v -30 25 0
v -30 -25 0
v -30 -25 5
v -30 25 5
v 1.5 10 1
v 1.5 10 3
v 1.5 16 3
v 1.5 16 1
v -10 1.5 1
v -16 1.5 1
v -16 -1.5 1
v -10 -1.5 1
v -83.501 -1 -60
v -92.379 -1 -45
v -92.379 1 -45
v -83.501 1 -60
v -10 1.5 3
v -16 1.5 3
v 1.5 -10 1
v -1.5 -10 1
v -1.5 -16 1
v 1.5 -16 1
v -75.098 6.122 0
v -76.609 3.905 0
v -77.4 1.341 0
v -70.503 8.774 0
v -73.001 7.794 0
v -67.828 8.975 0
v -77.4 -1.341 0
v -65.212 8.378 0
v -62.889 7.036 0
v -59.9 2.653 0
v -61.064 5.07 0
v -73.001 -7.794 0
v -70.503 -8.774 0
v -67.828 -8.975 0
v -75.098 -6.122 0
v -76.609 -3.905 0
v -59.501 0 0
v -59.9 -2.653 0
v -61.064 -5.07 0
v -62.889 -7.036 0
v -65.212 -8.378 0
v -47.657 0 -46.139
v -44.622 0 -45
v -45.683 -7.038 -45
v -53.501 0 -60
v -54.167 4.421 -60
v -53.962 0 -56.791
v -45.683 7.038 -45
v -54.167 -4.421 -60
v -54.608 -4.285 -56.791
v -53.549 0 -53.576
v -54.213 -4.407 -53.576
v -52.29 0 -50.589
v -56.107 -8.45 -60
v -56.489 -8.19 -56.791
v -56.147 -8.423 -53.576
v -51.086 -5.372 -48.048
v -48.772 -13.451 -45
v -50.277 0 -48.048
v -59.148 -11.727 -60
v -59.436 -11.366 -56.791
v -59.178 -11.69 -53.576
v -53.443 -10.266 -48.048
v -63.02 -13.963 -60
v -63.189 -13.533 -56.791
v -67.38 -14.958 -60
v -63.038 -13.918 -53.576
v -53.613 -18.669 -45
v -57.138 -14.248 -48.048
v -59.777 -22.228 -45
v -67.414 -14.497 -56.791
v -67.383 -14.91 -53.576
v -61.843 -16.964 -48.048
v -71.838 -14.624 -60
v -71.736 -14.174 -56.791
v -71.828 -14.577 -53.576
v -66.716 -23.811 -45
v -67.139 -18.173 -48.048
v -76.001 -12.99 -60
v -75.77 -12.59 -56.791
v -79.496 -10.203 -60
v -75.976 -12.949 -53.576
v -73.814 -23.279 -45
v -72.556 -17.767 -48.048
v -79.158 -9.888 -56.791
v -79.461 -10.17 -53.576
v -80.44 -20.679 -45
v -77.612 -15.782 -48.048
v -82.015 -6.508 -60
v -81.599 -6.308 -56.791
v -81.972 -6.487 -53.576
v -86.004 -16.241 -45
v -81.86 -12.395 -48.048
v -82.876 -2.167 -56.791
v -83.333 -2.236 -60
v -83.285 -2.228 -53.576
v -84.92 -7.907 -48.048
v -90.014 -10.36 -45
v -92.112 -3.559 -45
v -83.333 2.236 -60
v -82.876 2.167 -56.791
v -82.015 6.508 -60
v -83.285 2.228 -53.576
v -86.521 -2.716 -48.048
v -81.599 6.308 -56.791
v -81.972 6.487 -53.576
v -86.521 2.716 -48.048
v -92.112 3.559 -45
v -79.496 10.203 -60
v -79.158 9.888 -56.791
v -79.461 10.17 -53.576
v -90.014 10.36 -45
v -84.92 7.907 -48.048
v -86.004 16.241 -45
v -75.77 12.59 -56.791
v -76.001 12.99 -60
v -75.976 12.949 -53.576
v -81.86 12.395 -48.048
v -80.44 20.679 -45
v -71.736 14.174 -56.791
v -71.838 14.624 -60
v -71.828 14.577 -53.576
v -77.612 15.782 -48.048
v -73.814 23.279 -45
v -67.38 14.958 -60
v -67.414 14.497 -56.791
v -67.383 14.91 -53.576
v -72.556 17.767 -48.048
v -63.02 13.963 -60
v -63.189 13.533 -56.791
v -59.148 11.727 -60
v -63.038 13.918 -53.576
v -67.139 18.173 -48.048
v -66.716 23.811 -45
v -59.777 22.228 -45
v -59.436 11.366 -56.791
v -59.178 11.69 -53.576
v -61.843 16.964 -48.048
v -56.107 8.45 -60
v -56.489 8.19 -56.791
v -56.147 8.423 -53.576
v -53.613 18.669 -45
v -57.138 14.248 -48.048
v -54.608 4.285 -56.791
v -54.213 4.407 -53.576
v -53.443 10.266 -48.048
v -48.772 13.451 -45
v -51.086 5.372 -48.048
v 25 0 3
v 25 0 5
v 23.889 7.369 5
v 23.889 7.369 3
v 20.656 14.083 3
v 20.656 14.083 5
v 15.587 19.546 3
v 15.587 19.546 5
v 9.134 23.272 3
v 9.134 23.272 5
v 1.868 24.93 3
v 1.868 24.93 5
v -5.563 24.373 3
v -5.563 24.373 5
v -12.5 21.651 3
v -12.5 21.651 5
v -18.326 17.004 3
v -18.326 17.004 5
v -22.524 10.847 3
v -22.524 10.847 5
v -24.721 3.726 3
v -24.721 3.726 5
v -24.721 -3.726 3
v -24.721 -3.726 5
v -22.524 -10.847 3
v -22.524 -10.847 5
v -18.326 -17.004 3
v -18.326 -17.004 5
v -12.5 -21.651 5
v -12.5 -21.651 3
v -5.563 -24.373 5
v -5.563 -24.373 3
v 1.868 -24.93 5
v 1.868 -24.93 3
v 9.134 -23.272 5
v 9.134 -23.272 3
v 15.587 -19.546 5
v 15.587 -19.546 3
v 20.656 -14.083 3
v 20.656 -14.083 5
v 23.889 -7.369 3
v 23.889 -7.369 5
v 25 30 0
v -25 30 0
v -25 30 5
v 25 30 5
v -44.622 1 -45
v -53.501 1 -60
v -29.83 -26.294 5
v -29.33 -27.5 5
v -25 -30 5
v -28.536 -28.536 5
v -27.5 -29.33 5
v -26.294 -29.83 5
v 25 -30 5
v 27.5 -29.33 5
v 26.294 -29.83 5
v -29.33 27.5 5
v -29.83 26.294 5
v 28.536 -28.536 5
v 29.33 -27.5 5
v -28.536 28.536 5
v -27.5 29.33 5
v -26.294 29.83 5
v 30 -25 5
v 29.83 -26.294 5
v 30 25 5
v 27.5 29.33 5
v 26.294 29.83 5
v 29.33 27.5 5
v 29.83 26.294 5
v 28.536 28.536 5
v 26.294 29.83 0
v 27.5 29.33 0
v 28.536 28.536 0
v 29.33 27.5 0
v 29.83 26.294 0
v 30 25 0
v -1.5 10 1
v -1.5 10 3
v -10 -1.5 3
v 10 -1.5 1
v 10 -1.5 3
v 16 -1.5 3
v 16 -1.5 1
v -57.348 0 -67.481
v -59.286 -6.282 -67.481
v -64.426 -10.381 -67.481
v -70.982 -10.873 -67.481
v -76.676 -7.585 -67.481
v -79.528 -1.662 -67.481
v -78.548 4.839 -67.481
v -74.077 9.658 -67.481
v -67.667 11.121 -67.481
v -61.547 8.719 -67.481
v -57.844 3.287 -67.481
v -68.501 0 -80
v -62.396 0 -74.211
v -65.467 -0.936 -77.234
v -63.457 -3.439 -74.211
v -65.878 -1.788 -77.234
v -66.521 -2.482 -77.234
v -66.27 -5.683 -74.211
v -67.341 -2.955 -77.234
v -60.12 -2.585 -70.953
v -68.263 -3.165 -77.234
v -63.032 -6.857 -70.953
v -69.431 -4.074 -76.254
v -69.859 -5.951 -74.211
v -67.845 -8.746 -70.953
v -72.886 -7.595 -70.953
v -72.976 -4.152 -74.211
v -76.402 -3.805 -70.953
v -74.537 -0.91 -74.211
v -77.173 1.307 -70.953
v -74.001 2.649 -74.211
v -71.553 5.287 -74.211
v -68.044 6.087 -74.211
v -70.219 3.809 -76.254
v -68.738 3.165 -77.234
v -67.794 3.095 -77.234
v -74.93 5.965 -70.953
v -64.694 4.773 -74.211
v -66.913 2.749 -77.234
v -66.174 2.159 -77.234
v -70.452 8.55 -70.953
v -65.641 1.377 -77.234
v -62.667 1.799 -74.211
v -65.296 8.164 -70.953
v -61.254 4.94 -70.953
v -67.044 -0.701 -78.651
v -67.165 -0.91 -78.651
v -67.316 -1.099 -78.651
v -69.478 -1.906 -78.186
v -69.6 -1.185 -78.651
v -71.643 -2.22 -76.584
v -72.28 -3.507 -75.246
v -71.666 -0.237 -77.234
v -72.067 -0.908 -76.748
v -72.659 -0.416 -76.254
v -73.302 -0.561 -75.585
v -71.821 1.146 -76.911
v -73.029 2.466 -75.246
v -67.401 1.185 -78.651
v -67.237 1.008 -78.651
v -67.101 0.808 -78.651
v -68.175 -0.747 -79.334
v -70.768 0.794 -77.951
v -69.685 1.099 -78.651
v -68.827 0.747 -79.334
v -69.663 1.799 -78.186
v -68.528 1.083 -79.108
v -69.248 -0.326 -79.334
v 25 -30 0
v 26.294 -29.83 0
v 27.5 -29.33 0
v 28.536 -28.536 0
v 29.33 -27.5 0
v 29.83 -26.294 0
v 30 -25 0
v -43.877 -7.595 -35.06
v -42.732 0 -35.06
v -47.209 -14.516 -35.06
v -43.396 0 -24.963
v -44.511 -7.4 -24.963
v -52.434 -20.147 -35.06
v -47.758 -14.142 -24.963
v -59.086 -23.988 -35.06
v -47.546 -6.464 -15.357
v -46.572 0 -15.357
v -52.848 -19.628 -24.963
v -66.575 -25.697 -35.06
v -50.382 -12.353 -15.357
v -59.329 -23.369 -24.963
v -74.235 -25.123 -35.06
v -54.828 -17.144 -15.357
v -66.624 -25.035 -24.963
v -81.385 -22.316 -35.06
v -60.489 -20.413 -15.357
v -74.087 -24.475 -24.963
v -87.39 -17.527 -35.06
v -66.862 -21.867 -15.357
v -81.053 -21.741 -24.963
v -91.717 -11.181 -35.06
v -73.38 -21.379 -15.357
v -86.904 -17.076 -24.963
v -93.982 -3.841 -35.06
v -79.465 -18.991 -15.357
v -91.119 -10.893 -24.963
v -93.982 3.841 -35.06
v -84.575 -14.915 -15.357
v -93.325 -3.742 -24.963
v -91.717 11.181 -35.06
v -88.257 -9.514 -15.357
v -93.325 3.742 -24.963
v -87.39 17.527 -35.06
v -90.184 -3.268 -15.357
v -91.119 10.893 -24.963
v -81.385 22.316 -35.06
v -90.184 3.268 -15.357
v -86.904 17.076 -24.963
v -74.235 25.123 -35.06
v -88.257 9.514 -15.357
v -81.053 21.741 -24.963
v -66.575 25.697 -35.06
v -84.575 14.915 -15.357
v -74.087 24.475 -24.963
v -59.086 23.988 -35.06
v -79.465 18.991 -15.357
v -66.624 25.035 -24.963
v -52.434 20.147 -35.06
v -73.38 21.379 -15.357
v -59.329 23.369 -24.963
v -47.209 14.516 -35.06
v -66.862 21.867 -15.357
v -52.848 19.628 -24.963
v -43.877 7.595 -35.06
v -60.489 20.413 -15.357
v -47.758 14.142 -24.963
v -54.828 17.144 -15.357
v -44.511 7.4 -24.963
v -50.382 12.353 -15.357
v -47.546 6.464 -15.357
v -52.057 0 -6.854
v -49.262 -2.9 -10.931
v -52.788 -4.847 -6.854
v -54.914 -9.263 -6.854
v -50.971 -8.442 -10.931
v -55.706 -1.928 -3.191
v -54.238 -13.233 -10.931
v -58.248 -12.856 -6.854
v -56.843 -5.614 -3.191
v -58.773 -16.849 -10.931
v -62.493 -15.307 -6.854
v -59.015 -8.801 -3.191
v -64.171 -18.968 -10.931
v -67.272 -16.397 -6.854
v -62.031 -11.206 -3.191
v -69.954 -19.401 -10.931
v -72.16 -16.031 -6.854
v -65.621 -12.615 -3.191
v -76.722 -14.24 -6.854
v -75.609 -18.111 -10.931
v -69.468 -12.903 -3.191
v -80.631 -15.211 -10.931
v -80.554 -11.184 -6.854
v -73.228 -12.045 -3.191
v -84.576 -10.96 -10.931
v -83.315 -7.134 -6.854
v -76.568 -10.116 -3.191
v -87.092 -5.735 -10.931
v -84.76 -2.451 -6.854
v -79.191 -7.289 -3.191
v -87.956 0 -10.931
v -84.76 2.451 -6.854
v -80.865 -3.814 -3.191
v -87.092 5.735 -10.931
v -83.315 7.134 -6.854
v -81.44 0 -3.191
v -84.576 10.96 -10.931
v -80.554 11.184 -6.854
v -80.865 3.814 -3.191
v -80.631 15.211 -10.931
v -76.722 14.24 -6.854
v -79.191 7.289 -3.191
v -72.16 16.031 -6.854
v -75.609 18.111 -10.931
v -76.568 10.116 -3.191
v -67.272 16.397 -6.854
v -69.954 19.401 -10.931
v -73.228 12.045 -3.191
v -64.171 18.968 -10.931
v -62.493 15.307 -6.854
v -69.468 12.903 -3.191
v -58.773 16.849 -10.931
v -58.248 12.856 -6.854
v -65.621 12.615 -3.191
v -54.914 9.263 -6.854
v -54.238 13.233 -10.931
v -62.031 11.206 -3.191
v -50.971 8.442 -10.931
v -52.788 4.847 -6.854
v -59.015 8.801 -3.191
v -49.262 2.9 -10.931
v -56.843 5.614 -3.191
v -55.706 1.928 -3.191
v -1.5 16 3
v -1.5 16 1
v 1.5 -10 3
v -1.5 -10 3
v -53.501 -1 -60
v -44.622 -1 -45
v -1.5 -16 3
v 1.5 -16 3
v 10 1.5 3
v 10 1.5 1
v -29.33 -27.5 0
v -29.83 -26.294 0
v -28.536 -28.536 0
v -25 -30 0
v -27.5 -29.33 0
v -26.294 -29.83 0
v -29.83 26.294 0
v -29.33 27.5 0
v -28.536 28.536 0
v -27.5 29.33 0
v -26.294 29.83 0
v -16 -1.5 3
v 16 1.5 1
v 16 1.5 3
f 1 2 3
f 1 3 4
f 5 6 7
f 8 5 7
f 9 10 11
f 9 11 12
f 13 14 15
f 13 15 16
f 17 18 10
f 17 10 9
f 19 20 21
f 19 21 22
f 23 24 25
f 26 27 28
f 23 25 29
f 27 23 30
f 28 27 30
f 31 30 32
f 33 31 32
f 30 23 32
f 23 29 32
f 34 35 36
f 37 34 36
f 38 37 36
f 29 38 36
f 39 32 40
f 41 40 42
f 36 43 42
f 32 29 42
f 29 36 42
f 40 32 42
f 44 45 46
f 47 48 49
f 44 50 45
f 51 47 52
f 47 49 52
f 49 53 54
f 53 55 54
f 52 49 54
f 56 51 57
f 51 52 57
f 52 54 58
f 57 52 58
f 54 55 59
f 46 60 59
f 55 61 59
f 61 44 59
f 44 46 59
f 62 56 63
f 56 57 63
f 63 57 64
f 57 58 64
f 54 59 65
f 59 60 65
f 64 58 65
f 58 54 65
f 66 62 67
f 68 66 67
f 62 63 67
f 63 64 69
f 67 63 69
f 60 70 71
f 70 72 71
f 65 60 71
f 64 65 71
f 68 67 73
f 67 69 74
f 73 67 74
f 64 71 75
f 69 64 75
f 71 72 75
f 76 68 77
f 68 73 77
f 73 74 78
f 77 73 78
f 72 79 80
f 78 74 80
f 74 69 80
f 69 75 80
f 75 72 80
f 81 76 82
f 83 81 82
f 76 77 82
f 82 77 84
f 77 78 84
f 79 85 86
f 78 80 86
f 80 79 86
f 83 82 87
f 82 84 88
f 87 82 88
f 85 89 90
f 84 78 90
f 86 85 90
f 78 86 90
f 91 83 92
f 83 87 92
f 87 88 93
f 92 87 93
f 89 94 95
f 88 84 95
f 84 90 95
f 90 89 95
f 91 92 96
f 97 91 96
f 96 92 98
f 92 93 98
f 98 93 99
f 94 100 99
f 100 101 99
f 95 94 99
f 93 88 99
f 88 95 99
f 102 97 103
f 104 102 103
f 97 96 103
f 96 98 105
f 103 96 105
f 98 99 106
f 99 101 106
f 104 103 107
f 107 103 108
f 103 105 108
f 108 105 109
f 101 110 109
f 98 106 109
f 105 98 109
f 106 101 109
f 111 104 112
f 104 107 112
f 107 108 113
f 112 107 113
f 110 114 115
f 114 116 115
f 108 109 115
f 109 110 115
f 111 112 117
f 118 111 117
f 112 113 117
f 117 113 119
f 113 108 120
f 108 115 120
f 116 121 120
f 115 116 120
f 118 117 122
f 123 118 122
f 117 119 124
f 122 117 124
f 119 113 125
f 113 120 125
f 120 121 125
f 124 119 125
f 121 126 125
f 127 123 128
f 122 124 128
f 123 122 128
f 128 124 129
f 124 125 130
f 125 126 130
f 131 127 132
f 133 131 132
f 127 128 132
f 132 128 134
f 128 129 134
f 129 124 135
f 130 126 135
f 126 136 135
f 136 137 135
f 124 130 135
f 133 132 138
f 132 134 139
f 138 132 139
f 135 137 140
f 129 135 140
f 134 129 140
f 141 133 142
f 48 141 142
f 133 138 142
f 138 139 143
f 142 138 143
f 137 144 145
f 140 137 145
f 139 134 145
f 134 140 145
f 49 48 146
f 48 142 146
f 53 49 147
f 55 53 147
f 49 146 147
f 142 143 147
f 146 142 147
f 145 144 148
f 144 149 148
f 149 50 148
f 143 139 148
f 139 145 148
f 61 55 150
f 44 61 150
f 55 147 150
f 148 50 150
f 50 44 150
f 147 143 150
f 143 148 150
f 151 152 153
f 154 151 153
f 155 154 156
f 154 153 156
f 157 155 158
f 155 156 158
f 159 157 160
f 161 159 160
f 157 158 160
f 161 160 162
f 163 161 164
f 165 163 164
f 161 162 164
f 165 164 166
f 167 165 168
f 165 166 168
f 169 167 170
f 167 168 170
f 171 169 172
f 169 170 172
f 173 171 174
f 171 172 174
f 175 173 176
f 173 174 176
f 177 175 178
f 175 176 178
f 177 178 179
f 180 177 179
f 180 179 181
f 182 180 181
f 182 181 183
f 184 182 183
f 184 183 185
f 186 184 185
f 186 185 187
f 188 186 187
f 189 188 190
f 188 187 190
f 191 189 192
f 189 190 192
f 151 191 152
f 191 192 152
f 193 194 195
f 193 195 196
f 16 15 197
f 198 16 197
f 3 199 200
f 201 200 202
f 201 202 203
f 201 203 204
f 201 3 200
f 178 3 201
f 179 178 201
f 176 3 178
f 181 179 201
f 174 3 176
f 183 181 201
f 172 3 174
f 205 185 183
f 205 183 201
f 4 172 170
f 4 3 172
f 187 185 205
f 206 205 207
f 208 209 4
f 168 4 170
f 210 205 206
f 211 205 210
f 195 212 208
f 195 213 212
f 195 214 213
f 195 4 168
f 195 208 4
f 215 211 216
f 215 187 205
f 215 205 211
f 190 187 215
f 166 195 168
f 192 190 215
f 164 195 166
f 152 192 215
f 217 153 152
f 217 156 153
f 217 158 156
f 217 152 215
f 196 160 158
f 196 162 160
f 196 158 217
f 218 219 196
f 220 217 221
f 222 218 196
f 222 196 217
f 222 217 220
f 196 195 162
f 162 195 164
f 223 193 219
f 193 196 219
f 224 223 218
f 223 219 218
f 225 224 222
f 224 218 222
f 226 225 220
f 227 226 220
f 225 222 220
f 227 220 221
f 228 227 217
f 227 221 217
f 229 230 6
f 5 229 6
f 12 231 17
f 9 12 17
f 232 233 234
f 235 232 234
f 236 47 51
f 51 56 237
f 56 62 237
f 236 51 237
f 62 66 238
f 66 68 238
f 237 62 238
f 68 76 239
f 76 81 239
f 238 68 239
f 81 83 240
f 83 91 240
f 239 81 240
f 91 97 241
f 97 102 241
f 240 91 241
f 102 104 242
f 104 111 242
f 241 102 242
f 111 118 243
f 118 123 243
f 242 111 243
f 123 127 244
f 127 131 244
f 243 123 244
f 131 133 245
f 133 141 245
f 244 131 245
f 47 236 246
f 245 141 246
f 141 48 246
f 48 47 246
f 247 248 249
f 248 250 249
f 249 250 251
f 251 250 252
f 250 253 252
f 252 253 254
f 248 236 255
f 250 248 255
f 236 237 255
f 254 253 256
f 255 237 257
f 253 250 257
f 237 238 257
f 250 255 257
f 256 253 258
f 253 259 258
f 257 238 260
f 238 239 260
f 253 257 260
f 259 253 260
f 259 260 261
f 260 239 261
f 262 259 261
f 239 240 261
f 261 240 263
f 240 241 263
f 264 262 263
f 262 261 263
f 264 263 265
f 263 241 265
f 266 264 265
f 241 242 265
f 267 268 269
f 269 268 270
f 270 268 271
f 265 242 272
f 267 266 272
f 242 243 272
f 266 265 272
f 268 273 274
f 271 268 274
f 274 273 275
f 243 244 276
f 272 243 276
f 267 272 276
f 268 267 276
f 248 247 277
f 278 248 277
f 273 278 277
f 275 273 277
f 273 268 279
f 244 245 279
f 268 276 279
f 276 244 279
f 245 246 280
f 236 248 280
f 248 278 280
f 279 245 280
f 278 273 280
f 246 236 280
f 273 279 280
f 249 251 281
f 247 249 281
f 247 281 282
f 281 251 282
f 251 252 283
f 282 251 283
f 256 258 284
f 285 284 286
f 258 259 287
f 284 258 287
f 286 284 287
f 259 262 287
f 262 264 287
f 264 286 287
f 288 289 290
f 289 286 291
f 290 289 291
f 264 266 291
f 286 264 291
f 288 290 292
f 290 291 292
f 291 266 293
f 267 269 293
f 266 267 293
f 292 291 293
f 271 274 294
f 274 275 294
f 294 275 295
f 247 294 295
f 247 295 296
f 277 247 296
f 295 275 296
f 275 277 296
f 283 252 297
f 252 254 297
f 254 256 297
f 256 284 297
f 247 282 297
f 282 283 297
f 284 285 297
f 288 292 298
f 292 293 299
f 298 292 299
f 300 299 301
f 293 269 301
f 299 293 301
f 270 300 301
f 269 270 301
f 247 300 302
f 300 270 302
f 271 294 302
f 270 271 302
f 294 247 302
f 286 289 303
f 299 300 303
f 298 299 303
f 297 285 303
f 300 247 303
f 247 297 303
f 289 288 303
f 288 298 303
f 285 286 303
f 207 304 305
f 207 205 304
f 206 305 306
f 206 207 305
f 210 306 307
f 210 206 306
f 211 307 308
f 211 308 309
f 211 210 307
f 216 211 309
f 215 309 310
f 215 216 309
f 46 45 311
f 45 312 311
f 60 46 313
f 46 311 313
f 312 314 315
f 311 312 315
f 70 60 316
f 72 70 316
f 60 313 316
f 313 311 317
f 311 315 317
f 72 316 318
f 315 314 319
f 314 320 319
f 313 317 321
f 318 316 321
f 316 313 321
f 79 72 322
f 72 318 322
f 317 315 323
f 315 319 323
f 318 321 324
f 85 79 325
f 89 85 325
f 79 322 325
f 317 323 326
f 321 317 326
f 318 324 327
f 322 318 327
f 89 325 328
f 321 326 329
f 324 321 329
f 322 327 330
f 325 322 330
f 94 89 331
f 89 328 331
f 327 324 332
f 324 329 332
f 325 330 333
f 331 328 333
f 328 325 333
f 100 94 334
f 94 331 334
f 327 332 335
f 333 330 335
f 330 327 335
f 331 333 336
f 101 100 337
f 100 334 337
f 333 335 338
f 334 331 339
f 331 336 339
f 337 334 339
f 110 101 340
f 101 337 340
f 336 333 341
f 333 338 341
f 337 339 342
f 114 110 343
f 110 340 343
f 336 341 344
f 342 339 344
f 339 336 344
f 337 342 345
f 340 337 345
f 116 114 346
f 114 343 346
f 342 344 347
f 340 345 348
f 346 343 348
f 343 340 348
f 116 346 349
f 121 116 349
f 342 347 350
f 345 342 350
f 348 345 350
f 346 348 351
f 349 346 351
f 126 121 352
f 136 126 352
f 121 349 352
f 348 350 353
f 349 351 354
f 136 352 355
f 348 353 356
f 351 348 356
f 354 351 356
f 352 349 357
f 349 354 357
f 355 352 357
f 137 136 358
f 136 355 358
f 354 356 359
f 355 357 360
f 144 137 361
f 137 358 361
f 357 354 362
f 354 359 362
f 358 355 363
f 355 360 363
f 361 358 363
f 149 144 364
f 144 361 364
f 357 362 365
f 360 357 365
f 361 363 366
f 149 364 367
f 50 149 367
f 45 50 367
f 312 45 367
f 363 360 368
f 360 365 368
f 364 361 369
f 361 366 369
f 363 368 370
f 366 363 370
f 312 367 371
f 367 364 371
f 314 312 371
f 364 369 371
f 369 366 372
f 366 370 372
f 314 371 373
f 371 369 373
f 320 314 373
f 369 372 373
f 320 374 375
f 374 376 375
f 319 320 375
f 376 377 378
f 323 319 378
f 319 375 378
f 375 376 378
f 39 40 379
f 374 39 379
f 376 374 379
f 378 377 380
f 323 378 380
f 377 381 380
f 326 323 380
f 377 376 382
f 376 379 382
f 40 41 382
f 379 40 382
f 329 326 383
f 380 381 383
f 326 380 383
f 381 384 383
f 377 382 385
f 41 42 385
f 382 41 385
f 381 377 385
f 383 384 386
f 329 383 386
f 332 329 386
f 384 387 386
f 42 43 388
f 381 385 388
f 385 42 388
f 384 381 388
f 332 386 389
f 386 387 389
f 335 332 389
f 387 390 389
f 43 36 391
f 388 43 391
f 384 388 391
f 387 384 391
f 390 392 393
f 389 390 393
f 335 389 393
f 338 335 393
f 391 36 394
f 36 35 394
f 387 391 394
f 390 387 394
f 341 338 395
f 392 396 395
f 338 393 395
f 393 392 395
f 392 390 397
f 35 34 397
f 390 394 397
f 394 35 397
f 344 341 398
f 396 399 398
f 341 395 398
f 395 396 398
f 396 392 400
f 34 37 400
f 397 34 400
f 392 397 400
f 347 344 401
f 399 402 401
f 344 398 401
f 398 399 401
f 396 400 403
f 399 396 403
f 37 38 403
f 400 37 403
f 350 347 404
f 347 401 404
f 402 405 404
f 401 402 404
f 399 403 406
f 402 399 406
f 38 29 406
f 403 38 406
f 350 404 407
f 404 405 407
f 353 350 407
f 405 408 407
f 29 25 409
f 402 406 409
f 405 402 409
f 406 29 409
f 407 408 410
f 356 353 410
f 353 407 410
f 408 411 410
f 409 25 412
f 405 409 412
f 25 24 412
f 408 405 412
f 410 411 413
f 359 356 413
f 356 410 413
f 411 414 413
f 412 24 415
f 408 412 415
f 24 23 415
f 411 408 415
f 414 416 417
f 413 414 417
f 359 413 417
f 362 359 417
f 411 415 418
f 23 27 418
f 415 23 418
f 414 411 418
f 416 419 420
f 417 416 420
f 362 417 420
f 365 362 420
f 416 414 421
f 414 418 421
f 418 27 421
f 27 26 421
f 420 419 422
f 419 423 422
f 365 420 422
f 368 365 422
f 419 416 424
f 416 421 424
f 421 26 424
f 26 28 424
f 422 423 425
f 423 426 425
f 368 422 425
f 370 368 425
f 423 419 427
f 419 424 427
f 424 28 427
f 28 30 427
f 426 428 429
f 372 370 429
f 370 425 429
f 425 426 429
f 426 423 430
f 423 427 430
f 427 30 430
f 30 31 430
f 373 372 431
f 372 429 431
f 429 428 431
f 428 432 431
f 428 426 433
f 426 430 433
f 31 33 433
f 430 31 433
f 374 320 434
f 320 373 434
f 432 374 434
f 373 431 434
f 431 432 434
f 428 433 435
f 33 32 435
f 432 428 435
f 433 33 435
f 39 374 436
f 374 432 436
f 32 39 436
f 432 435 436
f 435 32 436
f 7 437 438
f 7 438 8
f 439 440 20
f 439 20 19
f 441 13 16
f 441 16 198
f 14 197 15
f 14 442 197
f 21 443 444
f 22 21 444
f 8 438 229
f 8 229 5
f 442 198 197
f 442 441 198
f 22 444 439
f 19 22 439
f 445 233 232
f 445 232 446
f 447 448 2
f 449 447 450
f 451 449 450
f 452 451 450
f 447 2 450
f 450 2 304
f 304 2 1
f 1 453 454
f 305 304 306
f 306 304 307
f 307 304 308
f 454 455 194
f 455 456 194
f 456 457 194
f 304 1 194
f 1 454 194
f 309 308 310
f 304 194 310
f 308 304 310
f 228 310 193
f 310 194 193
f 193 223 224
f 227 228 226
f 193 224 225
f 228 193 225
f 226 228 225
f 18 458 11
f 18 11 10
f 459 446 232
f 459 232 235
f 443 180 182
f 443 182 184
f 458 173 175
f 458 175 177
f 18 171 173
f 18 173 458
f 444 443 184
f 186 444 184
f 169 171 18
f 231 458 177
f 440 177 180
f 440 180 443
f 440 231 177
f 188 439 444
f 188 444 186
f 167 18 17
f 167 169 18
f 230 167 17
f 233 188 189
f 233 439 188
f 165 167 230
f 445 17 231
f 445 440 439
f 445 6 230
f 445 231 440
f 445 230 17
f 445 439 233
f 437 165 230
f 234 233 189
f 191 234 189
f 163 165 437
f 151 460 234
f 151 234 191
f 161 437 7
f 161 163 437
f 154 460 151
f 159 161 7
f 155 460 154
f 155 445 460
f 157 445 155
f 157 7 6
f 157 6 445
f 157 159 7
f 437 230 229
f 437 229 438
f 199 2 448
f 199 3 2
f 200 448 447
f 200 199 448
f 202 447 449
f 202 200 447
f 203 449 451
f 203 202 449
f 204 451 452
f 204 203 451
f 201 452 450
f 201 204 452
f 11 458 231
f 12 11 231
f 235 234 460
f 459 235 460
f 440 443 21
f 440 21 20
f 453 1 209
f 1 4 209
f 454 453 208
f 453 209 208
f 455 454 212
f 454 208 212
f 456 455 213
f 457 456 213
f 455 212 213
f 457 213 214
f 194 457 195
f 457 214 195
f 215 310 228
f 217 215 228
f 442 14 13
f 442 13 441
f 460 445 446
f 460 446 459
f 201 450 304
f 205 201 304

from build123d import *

# Parameters (mm, degrees)
F0_W      = 60
F0_H      = 60
F1_DEPTH  = 5
F2_R      = 25
F3_DEPTH  = 2
F4_R      = 5
F5_W      = 6
F5_H      = 3
F5_W_2    = 3
F5_H_2    = 6
F6_DEPTH  = 2
F7_W      = 7
F7_H      = 2
F10_DEPTH = 1


# Not quite as in the source:
# - a feature names something its author has since deleted; it is built from what else it names


with BuildPart() as f1:
    # F0 (on Top) → F1 (new body)
    with BuildSketch(Plane.XY):
        Rectangle(F0_W, F0_H)
    extrude(amount=F1_DEPTH)

    # F2 (on face) → F3 (cut)
    with BuildSketch(Plane.XY.offset(5)):
        Circle(F2_R)
    extrude(amount=-F3_DEPTH, mode=Mode.SUBTRACT)

    # F4
    f4_edges = [f1.edges().sort_by_distance(p)[0] for p in [
        (-30, -30, 2.5),
        (30, -30, 2.5),
        (30, 30, 2.5),
        (-30, 30, 2.5),
    ]]
    fillet(f4_edges, radius=F4_R)

    # F5 (on face) → F6 (cut)
    with BuildSketch(Plane.XY.offset(3)):
        with Locations((-13, 0)):
            Rectangle(F5_W, F5_H)
        with Locations((0, 13)):
            Rectangle(F5_W_2, F5_H_2)
        with Locations((13, 0)):
            Rectangle(F5_W, F5_H)
        with Locations((0, -13)):
            Rectangle(F5_W_2, F5_H_2)
    extrude(amount=-F6_DEPTH, mode=Mode.SUBTRACT)


with BuildPart() as f8:
    # F7 (on Front) → F8 (revolve)
    with BuildSketch(Plane.XZ):
        with Locations((-65.0005573104, -1)):
            Rectangle(F7_W, F7_H)
        with BuildLine():
            Line((-61.5005573104, -2), (-68.5005573104, -2))
            Line((-68.5005573104, -2), (-68.5005573104, -45))
            Line((-68.5005573104, -45), (-44.6224203376, -45))
            ThreePointArc((-44.6224203376, -45), (-44.6789062027, -20.0591316566), (-59.5005573104, 0))
            Line((-59.5005573104, 0), (-61.5005573104, 0))
            Line((-61.5005573104, 0), (-61.5005573104, -2))
        make_face()
        with BuildLine():
            Line((-44.6224203376, -45), (-68.5005573104, -45))
            Line((-68.5005573104, -45), (-68.5005573104, -60))
            Line((-68.5005573104, -60), (-53.5005573104, -60))
            ThreePointArc((-53.5005573104, -60), (-52.2895260676, -50.5894028799), (-44.6224203376, -45))
        make_face()
        with BuildLine():
            Line((-53.5005573104, -60), (-68.5005573104, -60))
            Line((-68.5005573104, -60), (-68.5005573104, -80))
            ThreePointArc((-68.5005573104, -80), (-59.7303907725, -70.9526249034), (-53.5005573104, -60))
        make_face()
    revolve(axis=Axis((-68.5005573104, 0, -40), (0, 0, -1)))


with BuildPart() as f10:
    # F9 (on Front) → F10 (new body, symmetric)
    with BuildSketch(Plane.XZ):
        Polygon((-44.6224203376, -45), (-92.3786942832, -45), (-83.5005573104, -60), (-53.5005573104, -60), align=None)
    extrude(amount=F10_DEPTH, both=True)


solid = Compound([f1.part, f8.part, f10.part])
